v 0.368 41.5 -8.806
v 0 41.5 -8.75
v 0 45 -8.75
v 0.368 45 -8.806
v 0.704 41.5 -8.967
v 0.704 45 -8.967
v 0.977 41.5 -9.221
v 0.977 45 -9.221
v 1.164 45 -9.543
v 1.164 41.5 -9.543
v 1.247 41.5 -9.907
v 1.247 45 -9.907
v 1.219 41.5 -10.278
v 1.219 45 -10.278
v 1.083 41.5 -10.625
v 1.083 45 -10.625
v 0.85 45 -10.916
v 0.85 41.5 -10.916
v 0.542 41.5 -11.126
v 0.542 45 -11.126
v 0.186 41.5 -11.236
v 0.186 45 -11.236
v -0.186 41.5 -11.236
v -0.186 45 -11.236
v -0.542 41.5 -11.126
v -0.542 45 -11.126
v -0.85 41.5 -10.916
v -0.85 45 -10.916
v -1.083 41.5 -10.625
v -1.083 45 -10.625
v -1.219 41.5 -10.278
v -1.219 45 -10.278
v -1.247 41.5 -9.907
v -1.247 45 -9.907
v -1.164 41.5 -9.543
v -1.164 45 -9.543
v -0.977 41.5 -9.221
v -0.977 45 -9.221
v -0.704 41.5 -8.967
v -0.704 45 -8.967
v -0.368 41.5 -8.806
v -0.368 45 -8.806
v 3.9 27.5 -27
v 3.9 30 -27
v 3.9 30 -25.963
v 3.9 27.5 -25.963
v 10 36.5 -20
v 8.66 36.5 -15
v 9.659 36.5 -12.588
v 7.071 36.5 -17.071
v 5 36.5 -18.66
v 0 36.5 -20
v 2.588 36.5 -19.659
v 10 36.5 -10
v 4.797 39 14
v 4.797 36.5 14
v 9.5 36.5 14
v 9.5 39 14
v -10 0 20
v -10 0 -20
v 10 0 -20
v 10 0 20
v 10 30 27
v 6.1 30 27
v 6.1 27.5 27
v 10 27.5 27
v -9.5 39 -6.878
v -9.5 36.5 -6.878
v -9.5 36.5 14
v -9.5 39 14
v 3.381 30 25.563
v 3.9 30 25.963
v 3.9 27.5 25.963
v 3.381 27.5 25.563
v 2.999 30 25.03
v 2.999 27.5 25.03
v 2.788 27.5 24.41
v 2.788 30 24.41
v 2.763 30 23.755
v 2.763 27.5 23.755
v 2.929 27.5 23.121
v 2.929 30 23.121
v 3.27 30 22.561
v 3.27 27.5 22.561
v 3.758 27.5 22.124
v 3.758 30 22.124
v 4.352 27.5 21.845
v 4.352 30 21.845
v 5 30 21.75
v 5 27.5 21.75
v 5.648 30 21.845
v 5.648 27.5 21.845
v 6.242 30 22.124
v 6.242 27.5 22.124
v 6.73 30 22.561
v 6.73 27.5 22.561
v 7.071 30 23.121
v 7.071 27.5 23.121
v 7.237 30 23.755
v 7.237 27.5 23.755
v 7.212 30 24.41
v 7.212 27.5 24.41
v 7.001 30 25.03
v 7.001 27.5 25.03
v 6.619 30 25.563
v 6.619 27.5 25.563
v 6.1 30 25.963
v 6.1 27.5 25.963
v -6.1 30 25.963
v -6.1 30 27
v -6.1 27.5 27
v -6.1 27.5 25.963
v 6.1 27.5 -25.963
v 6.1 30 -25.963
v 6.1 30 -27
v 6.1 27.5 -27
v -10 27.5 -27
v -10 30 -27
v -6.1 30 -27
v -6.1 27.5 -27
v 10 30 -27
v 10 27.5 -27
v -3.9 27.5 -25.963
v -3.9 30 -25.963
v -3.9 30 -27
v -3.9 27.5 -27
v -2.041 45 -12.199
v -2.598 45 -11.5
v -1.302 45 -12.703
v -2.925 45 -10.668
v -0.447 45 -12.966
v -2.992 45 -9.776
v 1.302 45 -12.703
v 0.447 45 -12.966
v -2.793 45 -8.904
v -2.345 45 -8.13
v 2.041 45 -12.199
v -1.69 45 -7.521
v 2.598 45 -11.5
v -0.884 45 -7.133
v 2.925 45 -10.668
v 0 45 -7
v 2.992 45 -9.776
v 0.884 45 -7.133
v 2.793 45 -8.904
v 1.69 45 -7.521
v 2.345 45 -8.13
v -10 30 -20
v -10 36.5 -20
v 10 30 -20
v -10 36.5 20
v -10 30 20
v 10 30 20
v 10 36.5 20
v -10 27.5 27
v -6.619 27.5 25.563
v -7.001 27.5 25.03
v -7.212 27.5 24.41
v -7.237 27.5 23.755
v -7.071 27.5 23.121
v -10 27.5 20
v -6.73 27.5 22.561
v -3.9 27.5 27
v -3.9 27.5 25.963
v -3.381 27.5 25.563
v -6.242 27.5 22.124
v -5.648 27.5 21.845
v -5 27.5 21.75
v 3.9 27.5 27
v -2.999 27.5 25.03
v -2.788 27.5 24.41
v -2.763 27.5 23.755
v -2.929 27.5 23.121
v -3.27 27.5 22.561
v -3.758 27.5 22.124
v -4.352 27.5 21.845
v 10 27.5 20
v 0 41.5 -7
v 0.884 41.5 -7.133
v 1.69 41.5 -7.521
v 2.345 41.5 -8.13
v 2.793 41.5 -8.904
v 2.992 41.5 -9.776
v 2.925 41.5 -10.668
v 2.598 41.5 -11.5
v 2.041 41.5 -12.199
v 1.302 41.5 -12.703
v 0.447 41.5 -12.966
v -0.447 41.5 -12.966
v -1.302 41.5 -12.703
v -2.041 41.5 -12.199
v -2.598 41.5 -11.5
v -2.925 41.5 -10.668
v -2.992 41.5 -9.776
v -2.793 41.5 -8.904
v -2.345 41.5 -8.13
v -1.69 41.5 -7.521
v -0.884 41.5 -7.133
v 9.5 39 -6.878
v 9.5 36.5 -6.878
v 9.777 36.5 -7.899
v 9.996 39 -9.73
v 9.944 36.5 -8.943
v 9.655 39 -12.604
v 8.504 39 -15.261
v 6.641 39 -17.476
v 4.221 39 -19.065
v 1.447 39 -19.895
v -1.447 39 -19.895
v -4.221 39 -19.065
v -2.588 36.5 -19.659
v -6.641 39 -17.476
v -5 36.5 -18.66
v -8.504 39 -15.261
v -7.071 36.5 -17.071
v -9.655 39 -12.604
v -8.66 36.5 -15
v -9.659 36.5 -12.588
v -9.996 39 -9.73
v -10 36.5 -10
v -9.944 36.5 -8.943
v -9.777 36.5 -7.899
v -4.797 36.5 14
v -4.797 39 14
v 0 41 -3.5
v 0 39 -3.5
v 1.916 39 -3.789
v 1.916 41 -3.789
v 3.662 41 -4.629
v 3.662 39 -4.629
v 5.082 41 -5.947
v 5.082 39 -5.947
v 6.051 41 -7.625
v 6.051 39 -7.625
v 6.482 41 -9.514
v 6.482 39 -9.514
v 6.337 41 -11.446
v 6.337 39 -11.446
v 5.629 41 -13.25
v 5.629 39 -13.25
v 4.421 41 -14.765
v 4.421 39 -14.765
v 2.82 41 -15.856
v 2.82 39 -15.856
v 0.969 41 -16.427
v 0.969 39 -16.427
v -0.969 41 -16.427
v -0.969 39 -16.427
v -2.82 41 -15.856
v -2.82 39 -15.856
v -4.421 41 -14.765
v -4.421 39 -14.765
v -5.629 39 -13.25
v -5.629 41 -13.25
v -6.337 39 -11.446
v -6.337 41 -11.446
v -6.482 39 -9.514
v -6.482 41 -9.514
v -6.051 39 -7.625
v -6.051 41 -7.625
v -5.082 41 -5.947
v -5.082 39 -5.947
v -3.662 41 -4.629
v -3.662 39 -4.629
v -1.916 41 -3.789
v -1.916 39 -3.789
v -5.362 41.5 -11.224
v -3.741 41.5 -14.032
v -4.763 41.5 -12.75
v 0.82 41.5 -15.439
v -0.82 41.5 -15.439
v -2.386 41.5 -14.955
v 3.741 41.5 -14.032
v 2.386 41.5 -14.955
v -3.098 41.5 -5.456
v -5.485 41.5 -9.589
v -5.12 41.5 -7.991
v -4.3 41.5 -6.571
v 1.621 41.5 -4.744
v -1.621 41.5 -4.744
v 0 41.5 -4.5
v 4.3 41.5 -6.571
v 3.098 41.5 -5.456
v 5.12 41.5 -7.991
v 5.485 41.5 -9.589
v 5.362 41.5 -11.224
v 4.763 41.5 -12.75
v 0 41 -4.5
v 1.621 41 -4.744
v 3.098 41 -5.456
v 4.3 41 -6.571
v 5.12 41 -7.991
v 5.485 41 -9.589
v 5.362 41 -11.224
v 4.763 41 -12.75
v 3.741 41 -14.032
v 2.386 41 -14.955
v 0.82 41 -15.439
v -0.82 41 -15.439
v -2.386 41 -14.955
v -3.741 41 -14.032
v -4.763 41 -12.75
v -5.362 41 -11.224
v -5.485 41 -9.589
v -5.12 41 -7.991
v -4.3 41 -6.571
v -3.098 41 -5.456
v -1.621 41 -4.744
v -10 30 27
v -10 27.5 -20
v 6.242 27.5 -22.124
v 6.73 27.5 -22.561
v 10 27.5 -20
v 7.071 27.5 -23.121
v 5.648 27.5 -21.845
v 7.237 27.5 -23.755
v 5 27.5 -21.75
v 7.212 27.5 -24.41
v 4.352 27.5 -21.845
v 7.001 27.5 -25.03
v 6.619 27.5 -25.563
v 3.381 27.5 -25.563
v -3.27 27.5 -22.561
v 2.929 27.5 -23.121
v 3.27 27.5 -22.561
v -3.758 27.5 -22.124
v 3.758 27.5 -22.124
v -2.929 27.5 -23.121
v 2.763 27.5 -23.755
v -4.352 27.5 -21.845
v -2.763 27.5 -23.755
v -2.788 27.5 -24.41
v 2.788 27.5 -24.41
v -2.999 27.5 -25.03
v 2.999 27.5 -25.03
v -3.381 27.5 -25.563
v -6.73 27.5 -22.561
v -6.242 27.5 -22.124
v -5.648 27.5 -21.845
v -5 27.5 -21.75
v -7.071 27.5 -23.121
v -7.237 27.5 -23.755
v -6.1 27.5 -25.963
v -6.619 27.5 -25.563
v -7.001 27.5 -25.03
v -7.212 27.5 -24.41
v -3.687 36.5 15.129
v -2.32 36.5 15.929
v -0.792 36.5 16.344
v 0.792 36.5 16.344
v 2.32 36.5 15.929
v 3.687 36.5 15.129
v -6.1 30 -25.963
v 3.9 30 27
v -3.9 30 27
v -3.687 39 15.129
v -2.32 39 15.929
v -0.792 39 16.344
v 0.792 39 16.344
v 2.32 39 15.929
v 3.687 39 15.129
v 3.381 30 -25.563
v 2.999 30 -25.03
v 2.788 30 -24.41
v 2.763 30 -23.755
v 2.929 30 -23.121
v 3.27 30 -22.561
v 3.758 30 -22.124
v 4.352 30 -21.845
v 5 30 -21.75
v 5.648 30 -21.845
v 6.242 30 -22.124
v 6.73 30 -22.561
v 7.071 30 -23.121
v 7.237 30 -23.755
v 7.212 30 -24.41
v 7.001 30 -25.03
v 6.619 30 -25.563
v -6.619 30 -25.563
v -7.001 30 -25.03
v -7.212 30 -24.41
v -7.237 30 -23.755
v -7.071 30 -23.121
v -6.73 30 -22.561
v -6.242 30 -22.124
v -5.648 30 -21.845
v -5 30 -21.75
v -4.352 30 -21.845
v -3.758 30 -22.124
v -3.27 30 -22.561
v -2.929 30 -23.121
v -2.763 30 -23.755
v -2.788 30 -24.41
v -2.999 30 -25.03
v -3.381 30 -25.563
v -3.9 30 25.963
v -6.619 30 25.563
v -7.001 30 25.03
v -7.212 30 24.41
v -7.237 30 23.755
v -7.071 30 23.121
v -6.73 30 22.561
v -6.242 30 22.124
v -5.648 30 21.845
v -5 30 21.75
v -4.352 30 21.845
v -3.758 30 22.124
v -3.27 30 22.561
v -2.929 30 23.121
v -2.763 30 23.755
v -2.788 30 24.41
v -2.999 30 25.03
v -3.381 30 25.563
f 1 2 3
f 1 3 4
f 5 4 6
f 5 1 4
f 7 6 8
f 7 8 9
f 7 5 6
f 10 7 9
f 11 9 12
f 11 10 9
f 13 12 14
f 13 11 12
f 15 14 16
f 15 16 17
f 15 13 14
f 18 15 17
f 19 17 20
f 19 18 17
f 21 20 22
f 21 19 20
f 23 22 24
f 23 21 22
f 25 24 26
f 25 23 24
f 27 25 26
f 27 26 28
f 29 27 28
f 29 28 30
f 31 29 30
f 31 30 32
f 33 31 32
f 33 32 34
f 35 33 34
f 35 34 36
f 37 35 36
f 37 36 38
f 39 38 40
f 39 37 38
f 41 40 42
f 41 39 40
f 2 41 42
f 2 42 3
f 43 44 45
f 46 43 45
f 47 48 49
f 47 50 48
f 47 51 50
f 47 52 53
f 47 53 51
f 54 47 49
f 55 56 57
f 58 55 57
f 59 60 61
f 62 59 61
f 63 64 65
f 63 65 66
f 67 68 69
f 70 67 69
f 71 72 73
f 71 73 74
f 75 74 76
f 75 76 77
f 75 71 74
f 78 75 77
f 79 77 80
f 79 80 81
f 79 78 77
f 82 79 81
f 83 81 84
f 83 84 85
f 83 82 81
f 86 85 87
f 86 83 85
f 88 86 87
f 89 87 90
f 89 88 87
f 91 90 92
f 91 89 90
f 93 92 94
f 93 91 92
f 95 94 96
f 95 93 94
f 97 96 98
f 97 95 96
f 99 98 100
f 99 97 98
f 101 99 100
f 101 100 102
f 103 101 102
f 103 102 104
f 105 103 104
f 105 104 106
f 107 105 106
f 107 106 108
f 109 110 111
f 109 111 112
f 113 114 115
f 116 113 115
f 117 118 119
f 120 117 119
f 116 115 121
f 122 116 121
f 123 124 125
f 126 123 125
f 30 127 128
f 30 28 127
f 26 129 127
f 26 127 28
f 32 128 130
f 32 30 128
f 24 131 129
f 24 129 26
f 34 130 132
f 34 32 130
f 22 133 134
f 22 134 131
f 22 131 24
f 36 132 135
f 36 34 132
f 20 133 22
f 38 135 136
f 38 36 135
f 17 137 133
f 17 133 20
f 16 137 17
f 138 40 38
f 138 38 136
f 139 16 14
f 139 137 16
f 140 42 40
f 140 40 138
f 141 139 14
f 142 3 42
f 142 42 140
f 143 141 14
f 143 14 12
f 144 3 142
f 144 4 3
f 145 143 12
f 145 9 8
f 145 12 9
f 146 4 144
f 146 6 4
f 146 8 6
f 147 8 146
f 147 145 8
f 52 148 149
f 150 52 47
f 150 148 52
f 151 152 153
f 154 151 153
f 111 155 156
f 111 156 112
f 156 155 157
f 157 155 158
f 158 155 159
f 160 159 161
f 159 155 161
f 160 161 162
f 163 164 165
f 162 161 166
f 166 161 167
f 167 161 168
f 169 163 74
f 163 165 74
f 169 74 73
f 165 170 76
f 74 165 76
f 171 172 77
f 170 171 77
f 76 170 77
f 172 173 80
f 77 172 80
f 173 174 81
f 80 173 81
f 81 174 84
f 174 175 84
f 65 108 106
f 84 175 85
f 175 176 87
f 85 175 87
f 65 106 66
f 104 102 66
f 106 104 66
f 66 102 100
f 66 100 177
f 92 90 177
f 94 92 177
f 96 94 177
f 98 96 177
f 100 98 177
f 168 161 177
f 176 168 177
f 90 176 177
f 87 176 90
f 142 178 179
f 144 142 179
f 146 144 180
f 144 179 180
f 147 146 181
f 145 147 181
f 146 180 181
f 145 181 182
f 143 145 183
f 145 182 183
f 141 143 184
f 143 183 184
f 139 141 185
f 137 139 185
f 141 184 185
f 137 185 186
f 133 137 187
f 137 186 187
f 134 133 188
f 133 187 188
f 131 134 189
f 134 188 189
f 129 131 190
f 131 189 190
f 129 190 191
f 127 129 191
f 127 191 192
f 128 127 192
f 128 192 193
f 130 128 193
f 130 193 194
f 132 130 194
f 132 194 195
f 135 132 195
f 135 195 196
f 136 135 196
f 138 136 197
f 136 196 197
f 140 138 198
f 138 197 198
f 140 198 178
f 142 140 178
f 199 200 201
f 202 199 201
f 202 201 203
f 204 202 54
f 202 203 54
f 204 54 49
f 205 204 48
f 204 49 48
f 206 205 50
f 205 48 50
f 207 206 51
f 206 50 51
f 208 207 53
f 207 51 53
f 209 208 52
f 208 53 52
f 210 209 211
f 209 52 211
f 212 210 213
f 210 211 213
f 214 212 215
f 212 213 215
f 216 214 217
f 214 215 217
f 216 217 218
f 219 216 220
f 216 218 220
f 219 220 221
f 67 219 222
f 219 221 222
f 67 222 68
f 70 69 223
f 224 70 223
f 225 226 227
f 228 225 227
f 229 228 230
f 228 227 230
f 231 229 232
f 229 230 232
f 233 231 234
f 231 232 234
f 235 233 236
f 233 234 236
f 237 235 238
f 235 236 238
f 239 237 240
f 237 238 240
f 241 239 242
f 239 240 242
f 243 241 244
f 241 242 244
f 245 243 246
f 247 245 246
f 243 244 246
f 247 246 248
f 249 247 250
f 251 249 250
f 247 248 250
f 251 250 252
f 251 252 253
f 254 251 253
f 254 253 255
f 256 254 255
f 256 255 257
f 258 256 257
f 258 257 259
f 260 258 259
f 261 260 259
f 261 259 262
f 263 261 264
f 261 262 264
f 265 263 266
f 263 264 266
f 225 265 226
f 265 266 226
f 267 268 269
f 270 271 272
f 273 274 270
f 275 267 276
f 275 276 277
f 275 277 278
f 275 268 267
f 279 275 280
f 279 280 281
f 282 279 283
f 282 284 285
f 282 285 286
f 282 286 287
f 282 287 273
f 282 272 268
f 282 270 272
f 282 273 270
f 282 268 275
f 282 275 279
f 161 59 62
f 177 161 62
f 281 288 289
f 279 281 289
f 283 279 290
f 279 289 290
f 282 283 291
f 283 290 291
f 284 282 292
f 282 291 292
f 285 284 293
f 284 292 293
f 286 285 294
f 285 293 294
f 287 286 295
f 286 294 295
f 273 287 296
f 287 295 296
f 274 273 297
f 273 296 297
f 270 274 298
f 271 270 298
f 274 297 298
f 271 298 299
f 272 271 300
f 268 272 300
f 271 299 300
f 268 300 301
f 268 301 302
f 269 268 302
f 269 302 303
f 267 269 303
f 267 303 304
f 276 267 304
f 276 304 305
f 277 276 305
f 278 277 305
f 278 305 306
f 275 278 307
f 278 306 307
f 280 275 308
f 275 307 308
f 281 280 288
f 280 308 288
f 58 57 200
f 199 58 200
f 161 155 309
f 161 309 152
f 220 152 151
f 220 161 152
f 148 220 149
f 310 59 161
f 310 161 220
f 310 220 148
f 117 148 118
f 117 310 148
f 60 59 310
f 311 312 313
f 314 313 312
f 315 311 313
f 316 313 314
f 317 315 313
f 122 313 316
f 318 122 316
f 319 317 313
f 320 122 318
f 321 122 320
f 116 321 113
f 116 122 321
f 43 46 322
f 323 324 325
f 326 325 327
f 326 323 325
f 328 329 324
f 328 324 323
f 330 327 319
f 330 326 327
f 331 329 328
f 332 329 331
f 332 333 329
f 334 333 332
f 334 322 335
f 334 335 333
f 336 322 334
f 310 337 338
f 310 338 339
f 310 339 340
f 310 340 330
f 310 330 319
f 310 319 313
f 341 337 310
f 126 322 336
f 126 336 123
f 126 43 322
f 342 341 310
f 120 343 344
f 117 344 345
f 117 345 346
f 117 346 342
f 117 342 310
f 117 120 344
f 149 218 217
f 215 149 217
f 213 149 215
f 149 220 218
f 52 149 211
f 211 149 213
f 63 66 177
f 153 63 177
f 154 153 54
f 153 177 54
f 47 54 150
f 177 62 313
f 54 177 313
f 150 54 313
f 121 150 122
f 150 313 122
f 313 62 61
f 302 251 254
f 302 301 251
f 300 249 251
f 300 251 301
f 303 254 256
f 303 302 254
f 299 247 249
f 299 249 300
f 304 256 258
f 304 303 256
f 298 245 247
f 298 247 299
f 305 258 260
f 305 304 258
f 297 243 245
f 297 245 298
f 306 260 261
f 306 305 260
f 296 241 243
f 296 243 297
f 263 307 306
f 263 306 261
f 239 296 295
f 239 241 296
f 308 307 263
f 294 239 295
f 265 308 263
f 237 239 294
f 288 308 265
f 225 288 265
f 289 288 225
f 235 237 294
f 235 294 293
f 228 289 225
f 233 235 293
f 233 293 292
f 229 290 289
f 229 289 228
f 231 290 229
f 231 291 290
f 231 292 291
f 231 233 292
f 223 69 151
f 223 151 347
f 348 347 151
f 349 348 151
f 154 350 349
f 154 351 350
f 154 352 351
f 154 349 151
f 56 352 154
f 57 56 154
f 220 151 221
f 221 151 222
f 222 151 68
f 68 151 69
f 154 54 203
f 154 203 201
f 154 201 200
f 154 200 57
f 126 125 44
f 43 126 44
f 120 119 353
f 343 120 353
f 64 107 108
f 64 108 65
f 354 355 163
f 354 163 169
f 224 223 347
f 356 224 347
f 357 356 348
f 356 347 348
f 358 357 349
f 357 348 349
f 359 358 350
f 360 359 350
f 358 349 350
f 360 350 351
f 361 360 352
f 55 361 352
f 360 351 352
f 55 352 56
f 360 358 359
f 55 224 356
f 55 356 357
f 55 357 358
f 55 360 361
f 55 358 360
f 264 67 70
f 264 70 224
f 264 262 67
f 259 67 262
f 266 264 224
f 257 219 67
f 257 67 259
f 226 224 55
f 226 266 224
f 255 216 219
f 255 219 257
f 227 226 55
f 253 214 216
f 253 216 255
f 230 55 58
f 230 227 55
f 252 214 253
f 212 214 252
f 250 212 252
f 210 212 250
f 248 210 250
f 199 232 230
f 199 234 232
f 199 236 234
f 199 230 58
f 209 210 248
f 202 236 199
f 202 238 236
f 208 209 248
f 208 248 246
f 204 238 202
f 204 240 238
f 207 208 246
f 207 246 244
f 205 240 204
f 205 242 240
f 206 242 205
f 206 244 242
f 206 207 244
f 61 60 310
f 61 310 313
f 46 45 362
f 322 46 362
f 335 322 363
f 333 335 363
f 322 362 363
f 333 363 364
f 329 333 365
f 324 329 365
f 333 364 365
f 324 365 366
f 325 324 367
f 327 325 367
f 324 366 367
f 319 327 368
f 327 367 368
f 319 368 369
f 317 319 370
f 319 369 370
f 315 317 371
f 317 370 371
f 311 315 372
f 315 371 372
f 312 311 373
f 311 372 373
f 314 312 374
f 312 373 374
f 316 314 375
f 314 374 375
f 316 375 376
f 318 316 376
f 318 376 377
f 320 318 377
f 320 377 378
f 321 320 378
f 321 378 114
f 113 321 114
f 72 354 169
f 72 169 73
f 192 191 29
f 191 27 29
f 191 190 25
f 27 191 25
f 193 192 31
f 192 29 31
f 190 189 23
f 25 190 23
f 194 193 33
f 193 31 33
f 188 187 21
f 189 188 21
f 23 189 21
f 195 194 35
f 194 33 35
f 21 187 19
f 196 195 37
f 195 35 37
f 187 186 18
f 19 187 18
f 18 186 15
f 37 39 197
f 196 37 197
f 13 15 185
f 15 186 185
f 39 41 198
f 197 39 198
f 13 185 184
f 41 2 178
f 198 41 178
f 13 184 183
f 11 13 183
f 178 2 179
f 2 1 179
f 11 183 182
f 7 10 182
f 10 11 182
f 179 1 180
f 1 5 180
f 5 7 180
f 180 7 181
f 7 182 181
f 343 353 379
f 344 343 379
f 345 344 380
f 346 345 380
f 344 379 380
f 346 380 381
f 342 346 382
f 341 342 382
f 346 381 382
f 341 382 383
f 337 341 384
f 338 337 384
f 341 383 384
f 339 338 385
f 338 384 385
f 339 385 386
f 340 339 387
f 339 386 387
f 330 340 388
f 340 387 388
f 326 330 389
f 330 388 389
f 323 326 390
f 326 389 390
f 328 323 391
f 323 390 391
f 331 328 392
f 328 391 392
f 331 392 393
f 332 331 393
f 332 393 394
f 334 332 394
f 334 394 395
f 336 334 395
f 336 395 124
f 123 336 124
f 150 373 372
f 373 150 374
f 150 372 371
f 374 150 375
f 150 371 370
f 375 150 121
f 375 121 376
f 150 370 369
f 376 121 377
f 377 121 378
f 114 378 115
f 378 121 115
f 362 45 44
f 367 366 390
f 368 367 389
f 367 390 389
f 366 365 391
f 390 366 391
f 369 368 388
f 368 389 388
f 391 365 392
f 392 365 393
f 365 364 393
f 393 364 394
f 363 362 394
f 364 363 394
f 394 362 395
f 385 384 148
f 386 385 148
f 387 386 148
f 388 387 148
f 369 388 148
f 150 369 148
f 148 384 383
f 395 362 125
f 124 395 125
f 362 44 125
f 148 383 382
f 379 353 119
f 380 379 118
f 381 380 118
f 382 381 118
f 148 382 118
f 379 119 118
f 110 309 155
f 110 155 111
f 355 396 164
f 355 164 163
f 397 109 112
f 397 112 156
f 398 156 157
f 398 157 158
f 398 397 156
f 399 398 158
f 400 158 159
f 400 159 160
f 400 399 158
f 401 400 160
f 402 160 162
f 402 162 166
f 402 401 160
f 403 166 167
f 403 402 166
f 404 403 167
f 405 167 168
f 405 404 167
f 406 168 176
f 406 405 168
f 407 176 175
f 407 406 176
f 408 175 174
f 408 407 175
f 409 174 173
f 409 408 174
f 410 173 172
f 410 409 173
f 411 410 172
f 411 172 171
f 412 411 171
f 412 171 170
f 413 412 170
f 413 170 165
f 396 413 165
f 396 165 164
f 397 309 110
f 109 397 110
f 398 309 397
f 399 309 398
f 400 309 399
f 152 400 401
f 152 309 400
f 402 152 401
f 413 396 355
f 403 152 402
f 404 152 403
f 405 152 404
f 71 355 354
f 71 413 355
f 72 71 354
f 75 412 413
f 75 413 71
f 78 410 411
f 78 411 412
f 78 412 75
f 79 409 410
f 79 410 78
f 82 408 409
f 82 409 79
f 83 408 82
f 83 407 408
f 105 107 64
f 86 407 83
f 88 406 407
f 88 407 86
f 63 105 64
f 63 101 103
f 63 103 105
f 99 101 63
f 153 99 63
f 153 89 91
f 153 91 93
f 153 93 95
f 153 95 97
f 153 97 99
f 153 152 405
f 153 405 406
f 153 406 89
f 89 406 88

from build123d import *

# Parameters (mm, degrees)
SKETCH_1_W      = 20
SKETCH_1_H      = 40
EXTRUDE_1_DEPTH = 36.5
EXTRUDE_2_DEPTH = 2.5
SKETCH_3_R      = 6.5
EXTRUDE_3_DEPTH = 2
SKETCH_4_R      = 5.5
EXTRUDE_4_DEPTH = 0.5
SKETCH_5_R      = 3
SKETCH_5_R_2    = 1.25
EXTRUDE_5_DEPTH = 3.5
EXTRUDE_6_DEPTH = 2.5


with BuildPart() as part:
    # 草图1 → 凸台-拉伸1 (new body)
    with BuildSketch(Plane(origin=(0, 0, 0), x_dir=(1, 0, 0), z_dir=(0, 1, 0))):
        Rectangle(SKETCH_1_W, SKETCH_1_H)
    extrude(amount=EXTRUDE_1_DEPTH)

    # 草图2 → 凸台-拉伸2 (add)
    with BuildSketch(Plane(origin=(0, 36.5, 0), x_dir=(1, 0, 0), z_dir=(0, 1, 0))):
        with BuildLine():
            Line((-9.5, 6.877501001), (-9.5, -14))
            Line((-9.5, -14), (-4.797030686, -14))
            ThreePointArc((-4.797030686, -14), (0, -16.396044313), (4.797030686, -14))
            Line((4.797030686, -14), (9.5, -14))
            Line((9.5, -14), (9.5, 6.877501001))
            ThreePointArc((9.5, 6.877501001), (0, 20), (-9.5, 6.877501001))
        make_face()
    extrude(amount=EXTRUDE_2_DEPTH)

    # 草图3 → 凸台-拉伸3 (add)
    with BuildSketch(Plane(origin=(0, 39, 0), x_dir=(1, 0, 0), z_dir=(0, 1, 0))):
        with Locations(Location((0, 10, 0), (0, 0, 270))):
            Circle(SKETCH_3_R)
    extrude(amount=EXTRUDE_3_DEPTH)

    # 草图4 → 凸台-拉伸4 (add)
    with BuildSketch(Plane(origin=(0, 41, 0), x_dir=(1, 0, 0), z_dir=(0, 1, 0))):
        with Locations(Location((0, 10, 0), (0, 0, 270))):
            Circle(SKETCH_4_R)
    extrude(amount=EXTRUDE_4_DEPTH)

    # 草图6 → 凸台-拉伸6 (add)
    with BuildSketch(Plane(origin=(0, 30, 0), x_dir=(-1, 0, 0), z_dir=(0, -1, 0))):
        with BuildLine():
            Line((10, 27), (6.1, 27))
            Line((6.1, 27), (6.1, 25.962778643))
            ThreePointArc((6.1, 25.962778643), (5, 21.75), (3.9, 25.962778643))
            Line((3.9, 25.962778643), (3.9, 27))
            Line((3.9, 27), (-3.9, 27))
            Line((-3.9, 27), (-3.9, 25.962778643))
            ThreePointArc((-3.9, 25.962778643), (-5, 21.75), (-6.1, 25.962778643))
            Line((-6.1, 25.962778643), (-6.1, 27))
            Line((-6.1, 27), (-10, 27))
            Line((-10, 27), (-10, 20))
            Line((-10, 20), (0, 20))
            Line((0, 20), (10, 20))
            Line((10, 20), (10, 27))
        make_face()
        with BuildLine():
            Line((-6.1, -27), (-10, -27))
            Line((-10, -27), (-10, -20))
            Line((-10, -20), (0, -20))
            Line((0, -20), (10, -20))
            Line((10, -20), (10, -27))
            Line((10, -27), (6.1, -27))
            Line((6.1, -27), (6.1, -25.962778643))
            ThreePointArc((6.1, -25.962778643), (5, -21.75), (3.9, -25.962778643))
            Line((3.9, -25.962778643), (3.9, -27))
            Line((3.9, -27), (-3.9, -27))
            Line((-3.9, -27), (-3.9, -25.962778643))
            ThreePointArc((-3.9, -25.962778643), (-5, -21.75), (-6.1, -25.962778643))
            Line((-6.1, -25.962778643), (-6.1, -27))
        make_face()
    extrude(amount=EXTRUDE_6_DEPTH)


with BuildPart() as body_2:
    # 草图5 → 凸台-拉伸5 (new body)
    with BuildSketch(Plane(origin=(0, 41.5, 0), x_dir=(1, 0, 0), z_dir=(0, 1, 0))):
        with Locations(Location((0, 10, 0), (0, 0, 270))):
            Circle(SKETCH_5_R)
        with Locations(Location((0, 10, 0), (0, 0, 270))):
            Circle(SKETCH_5_R_2, mode=Mode.SUBTRACT)
    extrude(amount=EXTRUDE_5_DEPTH)


solid = Compound([part.part, body_2.part])
